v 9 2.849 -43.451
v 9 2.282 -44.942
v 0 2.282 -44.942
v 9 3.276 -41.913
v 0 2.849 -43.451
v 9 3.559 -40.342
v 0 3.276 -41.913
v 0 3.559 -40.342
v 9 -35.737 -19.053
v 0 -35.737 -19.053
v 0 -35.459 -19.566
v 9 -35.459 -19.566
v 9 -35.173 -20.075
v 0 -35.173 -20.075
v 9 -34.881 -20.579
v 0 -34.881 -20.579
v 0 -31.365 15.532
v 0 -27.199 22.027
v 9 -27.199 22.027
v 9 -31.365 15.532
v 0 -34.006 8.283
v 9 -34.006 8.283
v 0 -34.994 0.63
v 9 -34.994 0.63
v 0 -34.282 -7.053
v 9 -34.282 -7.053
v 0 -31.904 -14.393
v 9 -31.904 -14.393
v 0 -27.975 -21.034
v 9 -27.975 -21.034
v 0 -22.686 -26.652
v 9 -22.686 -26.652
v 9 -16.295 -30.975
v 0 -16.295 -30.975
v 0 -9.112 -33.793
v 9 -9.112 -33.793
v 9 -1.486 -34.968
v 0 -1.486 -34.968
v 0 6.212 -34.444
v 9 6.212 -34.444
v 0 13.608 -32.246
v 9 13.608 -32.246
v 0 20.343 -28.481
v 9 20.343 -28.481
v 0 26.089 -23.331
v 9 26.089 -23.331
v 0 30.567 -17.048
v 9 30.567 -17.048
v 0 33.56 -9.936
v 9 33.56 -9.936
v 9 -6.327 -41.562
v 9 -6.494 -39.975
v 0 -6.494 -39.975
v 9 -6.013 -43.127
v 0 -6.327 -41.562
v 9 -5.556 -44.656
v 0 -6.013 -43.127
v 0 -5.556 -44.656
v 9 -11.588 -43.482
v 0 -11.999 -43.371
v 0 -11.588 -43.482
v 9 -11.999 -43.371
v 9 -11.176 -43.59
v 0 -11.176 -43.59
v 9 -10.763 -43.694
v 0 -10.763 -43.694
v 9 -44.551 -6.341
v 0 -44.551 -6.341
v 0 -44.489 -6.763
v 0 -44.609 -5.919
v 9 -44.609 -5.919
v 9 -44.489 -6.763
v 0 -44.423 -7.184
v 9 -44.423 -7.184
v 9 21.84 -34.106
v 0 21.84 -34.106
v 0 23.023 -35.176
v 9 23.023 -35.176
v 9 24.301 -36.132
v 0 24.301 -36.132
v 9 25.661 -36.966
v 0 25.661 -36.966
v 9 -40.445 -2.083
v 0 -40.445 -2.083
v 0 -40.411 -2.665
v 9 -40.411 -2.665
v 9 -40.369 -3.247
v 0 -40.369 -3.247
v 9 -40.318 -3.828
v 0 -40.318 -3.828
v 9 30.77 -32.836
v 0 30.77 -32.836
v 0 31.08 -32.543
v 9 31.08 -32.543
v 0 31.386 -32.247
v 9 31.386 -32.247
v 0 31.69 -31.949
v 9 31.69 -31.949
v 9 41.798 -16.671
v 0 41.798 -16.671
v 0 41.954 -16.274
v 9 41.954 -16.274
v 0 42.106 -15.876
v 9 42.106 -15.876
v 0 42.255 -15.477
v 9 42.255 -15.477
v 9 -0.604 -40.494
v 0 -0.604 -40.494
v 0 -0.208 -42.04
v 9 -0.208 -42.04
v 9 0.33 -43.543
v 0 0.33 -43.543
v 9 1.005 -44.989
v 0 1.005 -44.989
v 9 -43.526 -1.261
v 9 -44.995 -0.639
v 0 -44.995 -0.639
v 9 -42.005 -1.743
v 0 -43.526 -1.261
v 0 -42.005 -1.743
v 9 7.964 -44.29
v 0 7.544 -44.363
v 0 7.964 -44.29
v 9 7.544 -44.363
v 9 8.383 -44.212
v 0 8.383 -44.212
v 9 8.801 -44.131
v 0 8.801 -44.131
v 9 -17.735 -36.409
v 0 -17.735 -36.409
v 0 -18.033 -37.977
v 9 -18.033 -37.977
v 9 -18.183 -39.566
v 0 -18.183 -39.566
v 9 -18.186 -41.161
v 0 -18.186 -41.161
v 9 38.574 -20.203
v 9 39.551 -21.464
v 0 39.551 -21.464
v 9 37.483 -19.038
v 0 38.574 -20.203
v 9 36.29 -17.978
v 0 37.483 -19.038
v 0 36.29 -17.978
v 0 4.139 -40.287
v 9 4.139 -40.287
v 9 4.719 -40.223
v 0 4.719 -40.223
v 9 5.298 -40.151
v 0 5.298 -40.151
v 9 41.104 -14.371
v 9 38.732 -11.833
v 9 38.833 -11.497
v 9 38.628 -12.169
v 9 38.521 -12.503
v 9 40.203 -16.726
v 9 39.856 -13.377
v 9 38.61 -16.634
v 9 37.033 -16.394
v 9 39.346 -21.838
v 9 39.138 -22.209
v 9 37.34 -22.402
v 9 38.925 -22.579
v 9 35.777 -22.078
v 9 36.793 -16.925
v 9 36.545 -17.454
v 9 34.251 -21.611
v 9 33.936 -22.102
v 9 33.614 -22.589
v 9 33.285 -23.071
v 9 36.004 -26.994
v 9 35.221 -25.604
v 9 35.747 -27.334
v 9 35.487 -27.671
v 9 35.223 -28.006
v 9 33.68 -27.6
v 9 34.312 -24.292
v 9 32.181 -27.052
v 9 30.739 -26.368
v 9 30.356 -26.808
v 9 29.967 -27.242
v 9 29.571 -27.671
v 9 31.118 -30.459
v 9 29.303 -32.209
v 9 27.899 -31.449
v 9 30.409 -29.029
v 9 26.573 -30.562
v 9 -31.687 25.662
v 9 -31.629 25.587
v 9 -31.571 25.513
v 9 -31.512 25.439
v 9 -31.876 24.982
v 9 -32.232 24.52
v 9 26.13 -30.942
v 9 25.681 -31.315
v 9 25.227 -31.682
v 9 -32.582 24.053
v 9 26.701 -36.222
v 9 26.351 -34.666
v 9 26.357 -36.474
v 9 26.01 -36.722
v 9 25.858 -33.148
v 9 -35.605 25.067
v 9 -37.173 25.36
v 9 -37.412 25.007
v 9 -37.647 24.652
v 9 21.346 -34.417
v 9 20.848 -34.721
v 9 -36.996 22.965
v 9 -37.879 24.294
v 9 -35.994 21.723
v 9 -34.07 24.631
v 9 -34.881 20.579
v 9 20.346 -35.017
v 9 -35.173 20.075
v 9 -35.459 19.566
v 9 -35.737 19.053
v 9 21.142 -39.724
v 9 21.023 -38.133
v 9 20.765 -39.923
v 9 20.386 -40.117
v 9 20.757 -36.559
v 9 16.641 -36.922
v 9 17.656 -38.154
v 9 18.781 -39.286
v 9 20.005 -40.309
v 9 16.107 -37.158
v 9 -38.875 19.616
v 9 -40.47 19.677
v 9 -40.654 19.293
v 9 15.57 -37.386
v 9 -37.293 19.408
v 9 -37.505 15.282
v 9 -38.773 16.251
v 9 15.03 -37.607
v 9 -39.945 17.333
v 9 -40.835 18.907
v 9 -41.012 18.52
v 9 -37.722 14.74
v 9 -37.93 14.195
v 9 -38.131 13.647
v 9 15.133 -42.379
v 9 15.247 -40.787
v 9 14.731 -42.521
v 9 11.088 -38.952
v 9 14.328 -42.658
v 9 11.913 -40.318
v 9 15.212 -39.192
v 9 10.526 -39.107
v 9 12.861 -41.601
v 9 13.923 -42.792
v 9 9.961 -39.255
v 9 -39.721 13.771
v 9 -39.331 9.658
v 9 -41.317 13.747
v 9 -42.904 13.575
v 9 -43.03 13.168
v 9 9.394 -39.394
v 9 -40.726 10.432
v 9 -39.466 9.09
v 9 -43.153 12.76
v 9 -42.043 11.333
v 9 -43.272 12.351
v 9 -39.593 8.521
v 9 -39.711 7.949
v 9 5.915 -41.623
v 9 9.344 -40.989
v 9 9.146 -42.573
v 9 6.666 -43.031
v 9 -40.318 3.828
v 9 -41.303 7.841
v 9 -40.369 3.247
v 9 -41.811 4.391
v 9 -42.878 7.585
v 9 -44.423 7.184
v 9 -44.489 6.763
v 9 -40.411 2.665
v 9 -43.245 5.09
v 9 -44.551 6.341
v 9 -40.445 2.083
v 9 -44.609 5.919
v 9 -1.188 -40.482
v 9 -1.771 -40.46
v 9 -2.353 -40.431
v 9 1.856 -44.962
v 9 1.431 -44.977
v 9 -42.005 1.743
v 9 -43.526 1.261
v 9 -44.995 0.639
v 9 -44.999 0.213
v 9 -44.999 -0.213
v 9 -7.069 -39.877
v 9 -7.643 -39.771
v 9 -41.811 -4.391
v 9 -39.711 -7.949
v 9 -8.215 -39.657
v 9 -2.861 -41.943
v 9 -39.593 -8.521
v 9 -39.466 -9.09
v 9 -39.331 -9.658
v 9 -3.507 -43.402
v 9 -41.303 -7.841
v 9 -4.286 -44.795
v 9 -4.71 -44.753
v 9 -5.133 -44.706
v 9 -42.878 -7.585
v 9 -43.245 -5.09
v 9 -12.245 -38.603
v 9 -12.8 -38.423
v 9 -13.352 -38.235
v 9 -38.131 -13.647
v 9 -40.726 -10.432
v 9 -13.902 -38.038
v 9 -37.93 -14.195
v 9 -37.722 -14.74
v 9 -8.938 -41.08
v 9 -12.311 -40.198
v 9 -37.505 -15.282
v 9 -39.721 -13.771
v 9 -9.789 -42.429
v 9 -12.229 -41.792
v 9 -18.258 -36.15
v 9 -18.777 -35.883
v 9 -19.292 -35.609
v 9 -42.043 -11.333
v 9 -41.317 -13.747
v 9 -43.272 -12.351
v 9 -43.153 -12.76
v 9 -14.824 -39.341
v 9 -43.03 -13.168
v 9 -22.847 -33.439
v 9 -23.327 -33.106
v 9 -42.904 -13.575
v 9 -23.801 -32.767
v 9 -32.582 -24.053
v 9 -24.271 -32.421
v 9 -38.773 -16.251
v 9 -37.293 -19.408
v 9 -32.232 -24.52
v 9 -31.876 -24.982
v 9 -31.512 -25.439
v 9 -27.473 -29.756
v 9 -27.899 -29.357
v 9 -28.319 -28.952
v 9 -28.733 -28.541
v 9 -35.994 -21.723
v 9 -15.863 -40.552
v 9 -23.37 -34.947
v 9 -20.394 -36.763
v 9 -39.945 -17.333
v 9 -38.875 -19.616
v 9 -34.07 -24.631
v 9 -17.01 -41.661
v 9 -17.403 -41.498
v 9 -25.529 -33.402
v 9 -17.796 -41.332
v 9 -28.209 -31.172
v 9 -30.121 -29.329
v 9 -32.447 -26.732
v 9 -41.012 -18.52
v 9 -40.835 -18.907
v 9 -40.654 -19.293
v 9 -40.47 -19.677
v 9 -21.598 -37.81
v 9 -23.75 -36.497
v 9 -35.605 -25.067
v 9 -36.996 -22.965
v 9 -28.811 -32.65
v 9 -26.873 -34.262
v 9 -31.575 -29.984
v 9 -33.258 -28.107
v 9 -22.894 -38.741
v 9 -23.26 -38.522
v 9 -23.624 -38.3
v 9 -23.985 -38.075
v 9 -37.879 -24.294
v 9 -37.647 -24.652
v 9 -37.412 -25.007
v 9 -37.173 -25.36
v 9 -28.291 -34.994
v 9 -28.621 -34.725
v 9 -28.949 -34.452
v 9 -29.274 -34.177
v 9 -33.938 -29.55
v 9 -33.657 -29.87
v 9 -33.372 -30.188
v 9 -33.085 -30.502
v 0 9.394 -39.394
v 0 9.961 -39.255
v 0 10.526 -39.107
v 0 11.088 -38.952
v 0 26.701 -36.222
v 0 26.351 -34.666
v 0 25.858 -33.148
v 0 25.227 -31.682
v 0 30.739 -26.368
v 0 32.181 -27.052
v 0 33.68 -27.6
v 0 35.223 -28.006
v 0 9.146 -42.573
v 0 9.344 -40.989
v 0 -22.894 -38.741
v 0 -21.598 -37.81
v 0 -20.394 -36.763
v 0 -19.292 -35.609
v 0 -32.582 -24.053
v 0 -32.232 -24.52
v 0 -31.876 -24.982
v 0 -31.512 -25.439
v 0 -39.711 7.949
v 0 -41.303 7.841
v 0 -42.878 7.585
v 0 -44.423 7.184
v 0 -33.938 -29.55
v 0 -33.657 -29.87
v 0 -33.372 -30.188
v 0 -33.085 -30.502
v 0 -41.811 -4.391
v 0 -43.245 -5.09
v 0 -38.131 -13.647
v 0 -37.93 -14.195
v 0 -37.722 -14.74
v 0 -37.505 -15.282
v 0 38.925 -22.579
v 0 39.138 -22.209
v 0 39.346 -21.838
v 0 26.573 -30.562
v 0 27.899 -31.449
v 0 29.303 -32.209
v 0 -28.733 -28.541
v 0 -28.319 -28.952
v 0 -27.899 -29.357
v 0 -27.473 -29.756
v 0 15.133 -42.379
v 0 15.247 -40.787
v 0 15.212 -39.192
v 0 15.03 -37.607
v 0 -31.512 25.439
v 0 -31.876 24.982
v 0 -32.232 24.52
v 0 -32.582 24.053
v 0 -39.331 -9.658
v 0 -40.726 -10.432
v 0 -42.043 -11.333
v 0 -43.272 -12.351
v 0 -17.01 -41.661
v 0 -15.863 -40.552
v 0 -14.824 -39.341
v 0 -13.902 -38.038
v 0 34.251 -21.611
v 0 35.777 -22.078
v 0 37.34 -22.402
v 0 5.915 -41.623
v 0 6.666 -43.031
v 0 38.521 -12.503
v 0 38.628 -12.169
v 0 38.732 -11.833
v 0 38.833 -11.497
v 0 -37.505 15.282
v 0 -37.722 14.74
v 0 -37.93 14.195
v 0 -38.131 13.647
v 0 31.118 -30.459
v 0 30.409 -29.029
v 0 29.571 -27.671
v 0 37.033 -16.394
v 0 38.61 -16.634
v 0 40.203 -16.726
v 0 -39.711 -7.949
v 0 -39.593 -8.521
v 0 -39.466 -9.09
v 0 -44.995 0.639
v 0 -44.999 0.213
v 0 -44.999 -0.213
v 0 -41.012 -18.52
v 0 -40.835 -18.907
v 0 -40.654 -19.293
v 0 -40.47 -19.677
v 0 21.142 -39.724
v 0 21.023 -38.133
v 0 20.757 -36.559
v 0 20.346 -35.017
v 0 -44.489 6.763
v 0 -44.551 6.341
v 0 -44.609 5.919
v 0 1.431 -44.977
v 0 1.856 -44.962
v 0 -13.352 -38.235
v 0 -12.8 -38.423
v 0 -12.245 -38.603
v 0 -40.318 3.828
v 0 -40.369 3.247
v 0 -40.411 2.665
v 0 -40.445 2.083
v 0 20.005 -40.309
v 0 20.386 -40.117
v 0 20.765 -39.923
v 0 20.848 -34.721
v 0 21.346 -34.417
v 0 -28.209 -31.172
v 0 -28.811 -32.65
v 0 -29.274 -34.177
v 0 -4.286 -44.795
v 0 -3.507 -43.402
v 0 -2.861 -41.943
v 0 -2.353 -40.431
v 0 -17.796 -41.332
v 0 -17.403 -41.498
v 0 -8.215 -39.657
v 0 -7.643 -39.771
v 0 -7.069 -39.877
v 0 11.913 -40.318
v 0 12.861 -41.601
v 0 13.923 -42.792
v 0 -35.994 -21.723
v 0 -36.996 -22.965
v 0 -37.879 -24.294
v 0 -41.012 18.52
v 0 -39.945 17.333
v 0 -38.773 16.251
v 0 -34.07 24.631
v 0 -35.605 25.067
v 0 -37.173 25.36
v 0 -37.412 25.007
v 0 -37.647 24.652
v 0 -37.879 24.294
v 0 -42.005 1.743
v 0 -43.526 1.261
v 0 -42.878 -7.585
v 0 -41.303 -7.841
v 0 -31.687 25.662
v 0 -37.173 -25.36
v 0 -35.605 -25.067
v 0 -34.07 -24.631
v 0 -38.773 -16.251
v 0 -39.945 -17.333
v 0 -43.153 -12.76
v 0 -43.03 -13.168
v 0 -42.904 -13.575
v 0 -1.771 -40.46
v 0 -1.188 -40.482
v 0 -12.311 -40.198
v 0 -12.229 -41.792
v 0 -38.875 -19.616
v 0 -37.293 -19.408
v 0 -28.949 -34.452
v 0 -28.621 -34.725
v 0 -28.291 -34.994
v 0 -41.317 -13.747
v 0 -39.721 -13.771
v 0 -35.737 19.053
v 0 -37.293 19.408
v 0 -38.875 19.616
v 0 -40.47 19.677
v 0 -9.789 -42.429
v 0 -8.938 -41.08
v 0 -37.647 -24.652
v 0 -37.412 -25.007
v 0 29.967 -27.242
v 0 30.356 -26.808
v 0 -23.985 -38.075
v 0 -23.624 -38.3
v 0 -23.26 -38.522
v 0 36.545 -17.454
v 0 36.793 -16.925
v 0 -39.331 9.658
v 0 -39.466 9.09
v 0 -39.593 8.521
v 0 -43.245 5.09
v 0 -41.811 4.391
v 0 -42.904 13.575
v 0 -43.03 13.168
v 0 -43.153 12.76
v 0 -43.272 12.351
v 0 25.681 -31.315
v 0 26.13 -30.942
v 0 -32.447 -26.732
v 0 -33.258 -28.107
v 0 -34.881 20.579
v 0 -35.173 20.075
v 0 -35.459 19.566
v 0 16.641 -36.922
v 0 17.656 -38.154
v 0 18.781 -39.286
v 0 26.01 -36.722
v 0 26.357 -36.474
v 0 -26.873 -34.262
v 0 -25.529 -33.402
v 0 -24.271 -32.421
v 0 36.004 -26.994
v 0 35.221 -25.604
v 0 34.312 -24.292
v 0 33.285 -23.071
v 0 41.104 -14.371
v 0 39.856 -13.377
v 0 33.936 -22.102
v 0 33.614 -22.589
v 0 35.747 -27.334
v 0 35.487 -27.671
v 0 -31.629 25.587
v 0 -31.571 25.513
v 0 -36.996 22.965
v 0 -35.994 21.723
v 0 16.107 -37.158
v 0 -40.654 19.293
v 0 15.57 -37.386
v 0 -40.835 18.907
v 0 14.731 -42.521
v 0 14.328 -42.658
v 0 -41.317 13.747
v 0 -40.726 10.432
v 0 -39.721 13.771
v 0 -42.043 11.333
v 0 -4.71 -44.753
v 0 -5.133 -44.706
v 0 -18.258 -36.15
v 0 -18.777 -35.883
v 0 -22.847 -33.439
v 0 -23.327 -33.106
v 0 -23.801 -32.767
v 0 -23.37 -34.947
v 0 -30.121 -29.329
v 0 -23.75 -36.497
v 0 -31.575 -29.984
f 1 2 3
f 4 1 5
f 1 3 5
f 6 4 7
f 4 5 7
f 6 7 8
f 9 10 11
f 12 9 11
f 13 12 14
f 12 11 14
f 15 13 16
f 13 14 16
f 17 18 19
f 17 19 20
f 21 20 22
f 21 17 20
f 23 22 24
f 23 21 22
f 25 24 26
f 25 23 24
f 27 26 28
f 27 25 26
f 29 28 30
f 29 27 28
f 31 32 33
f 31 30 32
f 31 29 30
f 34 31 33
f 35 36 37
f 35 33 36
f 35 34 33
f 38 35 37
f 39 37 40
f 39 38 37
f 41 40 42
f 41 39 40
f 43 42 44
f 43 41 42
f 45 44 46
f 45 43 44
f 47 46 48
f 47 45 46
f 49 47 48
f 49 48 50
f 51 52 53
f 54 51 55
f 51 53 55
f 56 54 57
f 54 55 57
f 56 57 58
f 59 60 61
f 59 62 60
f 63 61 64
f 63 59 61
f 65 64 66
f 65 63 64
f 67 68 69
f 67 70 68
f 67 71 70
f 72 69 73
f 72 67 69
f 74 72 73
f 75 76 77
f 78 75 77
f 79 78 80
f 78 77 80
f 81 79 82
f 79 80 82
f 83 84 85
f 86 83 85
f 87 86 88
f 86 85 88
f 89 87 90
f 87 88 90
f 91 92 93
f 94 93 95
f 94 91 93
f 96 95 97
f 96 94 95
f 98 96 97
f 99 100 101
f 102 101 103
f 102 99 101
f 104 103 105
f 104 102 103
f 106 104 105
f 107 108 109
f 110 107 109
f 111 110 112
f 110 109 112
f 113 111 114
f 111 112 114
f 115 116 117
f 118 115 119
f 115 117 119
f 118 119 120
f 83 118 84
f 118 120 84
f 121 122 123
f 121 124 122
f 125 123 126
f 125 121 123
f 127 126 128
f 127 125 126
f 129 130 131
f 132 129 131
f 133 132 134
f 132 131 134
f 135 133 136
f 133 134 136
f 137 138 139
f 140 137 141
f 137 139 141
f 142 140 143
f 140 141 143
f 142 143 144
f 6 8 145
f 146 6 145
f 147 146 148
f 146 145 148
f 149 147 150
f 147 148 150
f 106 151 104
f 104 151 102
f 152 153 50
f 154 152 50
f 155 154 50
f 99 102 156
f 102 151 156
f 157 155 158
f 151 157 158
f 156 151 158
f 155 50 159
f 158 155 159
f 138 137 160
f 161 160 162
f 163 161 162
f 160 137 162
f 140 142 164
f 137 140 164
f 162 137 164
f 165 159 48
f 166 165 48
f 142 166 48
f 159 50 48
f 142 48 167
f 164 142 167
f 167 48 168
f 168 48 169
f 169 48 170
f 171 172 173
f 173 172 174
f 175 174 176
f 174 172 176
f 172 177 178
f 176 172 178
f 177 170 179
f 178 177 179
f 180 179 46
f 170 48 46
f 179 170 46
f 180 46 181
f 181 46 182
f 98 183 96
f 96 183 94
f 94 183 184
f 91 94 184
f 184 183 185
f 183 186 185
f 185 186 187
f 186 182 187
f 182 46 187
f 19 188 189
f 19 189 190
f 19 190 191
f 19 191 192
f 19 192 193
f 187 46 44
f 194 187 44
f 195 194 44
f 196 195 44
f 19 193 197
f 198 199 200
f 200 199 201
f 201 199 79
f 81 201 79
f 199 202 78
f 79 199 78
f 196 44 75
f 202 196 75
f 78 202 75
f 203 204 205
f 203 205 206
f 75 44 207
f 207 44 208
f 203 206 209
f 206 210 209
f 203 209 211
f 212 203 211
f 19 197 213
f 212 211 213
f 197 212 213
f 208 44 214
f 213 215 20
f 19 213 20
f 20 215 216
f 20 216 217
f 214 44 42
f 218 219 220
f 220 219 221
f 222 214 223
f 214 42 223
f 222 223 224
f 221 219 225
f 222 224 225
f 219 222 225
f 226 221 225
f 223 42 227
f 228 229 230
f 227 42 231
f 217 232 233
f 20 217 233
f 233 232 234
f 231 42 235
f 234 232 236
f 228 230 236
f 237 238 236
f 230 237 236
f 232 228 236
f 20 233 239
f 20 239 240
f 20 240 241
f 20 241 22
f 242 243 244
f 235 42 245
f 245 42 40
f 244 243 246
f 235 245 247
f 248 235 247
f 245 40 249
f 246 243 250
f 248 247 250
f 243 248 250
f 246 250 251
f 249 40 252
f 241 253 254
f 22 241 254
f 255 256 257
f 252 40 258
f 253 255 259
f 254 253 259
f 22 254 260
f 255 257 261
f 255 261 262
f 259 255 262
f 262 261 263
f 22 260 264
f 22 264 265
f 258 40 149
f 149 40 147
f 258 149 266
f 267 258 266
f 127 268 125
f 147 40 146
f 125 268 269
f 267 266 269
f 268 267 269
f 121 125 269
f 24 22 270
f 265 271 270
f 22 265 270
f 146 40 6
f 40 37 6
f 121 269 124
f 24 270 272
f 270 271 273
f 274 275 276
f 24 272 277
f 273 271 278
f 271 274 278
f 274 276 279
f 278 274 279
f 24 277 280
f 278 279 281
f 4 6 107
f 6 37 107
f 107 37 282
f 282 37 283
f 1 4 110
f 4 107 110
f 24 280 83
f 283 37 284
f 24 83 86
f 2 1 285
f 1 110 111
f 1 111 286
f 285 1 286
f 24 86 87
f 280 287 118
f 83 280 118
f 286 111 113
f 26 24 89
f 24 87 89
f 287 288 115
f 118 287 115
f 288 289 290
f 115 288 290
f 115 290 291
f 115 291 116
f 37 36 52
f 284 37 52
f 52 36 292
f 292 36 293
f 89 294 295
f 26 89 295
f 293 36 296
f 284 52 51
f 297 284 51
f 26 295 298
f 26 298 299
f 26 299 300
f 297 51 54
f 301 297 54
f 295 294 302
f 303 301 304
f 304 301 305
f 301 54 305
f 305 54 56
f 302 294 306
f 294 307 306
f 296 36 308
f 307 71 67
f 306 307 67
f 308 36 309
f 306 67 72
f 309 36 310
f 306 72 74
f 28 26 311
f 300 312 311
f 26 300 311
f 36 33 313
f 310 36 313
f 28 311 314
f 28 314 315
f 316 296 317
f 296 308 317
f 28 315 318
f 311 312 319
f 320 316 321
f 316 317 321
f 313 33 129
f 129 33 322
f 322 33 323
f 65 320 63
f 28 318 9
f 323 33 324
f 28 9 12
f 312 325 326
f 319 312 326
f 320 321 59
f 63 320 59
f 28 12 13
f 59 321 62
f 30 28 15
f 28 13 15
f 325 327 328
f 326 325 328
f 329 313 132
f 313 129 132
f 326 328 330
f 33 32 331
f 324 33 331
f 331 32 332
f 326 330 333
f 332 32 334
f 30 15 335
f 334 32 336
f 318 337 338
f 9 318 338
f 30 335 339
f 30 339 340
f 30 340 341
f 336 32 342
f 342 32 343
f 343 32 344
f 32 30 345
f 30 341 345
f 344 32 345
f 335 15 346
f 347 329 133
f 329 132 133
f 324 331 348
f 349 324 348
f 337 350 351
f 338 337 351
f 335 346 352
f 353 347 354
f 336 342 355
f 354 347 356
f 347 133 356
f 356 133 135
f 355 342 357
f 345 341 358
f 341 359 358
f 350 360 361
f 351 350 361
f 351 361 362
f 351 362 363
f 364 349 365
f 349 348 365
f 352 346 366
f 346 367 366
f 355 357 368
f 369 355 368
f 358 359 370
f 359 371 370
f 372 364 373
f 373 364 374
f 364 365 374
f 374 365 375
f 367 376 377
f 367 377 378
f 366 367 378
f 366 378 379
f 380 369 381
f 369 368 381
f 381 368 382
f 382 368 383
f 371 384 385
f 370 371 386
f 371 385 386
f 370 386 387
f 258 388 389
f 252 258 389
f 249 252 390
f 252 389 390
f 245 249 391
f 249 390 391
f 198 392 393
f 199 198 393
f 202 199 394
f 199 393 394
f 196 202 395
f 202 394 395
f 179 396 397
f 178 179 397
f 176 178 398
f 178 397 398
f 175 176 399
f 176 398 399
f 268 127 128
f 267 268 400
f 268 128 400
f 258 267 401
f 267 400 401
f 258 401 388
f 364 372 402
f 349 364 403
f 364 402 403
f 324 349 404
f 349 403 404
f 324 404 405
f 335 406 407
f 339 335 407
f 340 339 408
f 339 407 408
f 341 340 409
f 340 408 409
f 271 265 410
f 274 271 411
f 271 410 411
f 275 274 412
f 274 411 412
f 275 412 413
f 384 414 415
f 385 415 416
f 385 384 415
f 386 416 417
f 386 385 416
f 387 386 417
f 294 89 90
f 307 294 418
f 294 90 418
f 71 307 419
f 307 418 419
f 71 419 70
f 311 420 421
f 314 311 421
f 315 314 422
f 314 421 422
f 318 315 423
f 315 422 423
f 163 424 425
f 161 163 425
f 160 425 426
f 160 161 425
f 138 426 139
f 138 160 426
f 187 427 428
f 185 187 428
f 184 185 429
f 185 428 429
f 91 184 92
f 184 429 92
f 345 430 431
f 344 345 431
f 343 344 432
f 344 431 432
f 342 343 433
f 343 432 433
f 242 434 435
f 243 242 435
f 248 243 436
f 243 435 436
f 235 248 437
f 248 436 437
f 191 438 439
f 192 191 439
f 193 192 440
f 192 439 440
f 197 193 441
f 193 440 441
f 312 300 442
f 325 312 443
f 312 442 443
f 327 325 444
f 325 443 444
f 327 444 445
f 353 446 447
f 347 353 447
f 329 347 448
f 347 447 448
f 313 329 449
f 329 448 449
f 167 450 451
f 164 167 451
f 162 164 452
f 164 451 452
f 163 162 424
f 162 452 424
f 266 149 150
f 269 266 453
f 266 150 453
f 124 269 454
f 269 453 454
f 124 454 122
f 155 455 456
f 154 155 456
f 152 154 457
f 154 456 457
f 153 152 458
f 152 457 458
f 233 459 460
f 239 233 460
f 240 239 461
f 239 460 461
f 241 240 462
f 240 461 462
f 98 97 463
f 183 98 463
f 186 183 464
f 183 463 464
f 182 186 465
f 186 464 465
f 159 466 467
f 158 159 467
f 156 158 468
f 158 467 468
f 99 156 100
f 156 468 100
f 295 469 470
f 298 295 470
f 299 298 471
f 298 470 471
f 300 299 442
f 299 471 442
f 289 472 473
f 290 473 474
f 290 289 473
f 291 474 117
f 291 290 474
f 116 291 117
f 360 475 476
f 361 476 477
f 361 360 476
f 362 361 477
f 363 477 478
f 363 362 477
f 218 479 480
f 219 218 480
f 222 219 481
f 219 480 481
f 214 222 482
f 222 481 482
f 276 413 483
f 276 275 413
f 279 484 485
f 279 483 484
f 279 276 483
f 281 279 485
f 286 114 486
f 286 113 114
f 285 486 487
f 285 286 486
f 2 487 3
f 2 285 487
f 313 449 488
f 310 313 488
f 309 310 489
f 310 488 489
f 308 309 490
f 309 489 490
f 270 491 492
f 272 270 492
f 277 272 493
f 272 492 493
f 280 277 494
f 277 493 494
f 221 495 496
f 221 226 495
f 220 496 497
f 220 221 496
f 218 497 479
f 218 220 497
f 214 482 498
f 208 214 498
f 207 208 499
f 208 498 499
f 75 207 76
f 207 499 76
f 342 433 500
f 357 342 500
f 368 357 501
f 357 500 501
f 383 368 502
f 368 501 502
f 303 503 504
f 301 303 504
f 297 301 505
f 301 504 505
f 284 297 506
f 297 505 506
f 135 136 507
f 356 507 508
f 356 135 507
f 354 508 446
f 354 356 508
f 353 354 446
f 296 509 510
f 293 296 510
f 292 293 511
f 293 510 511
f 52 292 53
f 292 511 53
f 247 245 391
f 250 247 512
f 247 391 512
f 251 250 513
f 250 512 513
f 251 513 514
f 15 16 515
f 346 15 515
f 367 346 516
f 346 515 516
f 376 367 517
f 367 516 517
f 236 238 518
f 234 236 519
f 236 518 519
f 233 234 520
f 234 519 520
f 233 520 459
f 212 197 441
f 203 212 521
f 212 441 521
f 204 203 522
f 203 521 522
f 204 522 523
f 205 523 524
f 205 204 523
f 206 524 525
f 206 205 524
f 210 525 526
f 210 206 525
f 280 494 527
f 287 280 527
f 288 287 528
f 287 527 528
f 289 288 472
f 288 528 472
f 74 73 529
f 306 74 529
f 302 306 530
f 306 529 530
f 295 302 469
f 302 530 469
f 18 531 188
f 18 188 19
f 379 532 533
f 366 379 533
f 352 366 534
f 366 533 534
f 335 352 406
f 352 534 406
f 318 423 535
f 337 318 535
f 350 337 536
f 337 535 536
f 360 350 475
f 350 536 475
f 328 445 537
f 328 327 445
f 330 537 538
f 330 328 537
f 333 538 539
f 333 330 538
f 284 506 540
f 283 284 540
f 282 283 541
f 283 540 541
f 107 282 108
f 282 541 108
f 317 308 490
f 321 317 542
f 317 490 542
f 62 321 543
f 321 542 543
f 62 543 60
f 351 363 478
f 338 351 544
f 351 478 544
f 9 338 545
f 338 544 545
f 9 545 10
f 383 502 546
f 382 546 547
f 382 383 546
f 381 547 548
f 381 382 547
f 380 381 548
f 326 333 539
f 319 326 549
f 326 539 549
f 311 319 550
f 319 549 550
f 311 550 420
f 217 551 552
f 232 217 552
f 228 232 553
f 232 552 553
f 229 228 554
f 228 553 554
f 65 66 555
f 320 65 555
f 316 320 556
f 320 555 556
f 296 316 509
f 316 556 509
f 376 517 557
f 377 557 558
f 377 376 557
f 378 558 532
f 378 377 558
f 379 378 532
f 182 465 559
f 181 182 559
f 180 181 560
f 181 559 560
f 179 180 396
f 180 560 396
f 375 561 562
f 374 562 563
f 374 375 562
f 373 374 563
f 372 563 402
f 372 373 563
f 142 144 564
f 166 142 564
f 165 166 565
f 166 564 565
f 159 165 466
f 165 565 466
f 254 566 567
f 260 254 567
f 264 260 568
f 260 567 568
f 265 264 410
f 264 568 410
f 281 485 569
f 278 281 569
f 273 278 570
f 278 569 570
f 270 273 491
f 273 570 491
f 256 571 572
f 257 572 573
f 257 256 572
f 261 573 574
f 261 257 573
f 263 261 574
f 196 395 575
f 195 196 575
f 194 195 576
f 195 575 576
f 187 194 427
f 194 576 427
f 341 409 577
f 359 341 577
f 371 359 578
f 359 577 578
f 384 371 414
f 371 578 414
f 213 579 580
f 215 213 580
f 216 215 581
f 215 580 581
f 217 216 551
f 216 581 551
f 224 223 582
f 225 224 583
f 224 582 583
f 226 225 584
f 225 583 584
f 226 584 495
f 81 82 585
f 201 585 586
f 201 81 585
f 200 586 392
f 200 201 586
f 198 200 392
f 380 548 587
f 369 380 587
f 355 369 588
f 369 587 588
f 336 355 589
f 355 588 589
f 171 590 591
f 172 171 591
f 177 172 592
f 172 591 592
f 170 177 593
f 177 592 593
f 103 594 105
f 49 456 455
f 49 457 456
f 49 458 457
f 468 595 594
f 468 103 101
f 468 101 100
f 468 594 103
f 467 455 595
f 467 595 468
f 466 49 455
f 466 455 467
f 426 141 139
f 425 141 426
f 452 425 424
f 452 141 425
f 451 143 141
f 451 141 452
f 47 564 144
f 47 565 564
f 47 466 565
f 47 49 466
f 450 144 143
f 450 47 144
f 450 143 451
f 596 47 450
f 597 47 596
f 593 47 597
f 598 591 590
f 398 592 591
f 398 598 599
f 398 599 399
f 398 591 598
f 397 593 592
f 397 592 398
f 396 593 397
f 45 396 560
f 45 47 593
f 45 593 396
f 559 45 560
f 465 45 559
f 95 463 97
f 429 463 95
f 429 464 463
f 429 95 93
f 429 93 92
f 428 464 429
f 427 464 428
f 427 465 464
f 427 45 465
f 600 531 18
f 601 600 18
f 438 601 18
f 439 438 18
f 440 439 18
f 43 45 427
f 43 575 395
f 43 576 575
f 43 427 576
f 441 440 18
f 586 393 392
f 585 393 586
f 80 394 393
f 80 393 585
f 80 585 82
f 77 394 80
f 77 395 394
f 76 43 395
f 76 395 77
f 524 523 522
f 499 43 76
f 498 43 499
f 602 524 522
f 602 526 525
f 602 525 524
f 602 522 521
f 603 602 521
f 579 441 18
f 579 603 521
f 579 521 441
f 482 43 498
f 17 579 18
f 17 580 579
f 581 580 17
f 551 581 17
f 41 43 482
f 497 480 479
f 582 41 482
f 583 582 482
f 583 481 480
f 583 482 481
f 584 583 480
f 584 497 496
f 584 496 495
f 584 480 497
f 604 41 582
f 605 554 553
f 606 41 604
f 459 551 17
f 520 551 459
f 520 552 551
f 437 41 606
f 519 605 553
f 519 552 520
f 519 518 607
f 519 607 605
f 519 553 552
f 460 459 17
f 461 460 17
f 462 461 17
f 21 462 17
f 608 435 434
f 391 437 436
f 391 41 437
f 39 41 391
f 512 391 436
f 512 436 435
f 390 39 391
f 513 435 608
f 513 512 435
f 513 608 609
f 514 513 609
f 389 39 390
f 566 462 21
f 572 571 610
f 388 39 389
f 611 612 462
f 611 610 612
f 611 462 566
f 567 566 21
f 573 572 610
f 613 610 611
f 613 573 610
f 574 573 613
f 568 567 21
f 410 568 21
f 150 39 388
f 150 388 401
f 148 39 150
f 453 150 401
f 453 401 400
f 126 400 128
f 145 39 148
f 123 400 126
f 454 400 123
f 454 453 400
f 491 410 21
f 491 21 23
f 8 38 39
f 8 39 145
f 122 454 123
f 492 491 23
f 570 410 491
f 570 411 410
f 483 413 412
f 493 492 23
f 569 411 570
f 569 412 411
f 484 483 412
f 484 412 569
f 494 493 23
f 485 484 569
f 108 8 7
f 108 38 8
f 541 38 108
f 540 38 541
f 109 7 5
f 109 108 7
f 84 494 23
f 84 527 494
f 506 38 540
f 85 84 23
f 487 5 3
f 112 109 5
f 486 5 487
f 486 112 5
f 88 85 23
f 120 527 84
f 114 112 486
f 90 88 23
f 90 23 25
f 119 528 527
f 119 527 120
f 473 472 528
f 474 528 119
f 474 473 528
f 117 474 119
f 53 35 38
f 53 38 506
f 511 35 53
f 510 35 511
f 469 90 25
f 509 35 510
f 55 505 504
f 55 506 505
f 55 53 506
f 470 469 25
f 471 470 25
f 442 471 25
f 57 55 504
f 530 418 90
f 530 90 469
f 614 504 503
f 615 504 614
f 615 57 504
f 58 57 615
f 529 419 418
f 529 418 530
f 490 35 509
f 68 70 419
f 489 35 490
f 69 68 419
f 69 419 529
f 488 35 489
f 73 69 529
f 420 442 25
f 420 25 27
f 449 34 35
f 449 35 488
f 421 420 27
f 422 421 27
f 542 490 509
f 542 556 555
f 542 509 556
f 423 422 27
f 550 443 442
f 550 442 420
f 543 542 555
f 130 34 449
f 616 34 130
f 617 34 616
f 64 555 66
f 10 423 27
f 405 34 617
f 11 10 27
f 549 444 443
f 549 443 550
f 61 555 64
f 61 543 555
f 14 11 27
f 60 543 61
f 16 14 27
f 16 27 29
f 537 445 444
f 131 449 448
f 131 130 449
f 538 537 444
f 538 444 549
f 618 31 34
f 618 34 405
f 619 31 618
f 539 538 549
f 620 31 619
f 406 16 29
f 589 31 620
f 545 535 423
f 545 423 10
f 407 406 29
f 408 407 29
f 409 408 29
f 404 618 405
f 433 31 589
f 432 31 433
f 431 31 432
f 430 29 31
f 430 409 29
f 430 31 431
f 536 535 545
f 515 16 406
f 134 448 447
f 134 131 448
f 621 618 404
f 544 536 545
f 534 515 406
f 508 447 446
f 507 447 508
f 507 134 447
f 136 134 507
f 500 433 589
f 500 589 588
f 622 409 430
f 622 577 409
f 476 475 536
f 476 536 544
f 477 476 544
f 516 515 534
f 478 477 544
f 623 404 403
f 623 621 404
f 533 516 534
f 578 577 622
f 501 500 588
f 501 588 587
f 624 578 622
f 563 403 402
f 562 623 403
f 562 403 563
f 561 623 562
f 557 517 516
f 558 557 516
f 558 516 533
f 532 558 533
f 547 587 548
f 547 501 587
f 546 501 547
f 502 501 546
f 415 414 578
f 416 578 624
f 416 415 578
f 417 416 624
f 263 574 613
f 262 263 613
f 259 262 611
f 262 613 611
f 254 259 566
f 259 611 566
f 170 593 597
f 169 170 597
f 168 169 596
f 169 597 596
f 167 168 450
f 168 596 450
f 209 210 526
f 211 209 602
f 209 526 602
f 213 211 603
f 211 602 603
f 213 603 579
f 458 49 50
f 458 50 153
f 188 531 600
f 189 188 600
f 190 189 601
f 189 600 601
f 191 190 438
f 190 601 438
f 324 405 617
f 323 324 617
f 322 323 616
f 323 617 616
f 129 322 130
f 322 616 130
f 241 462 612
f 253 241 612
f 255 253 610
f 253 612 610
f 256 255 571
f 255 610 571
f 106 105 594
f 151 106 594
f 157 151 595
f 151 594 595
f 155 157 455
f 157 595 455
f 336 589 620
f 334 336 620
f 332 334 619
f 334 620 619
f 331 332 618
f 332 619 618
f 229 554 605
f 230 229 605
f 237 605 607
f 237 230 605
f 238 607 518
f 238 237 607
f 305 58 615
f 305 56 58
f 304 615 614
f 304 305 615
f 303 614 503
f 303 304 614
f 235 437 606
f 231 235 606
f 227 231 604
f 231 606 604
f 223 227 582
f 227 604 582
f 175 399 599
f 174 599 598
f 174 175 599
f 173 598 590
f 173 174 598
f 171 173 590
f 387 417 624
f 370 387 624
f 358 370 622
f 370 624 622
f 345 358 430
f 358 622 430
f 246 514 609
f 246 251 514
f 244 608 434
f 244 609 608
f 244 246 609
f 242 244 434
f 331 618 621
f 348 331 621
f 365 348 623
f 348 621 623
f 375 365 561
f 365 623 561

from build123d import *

# Parameters (mm, degrees)
BASPROSKE_W                = 9
BASPROSKE_H                = 45
TOOTHCUT_DEPTH             = 65.272855857
TEETHCUTS_COUNT            = 43
TEETHCUTS_ANGLE            = 351.627906977
BORSKE_R                   = 3
BORE_DEPTH                 = 50.0000508
WYTNIJ_WYCI_GNI_CIE1_DEPTH = 65.265003825


with BuildPart() as part:
    # BasProSke → Base-Revolve (revolve)
    with BuildSketch(Plane(origin=(0, 0, 0), x_dir=(1, 0, 0), z_dir=(0, 1, 0)), mode=Mode.PRIVATE) as base_revolve_sk:
        with Locations((4.5, 22.5)):
            Rectangle(BASPROSKE_W, BASPROSKE_H)
    revolve(base_revolve_sk.sketch.rotate(Axis((-10, 0, 0), (1, 0, 0)), 180), axis=Axis((-10, 0, 0), (1, 0, 0)))

    # TooCutSke → ToothCut (cut, through all)
    with BuildSketch(Plane(origin=(0, 0, 0), x_dir=(0, 0, -1), z_dir=(1, 0, 0))):
        with BuildLine():
            ThreePointArc((0.875138877, 40.489543501), (0, 40.499), (-0.875138877, 40.489543501))
            ThreePointArc((-0.875138877, 40.489543501), (-1.611840844, 42.780747503), (-2.66114443, 44.94669015))
            ThreePointArc((-2.66114443, 44.94669015), (0, 45.0254), (2.66114443, 44.94669015))
            ThreePointArc((2.66114443, 44.94669015), (1.611840844, 42.780747503), (0.875138877, 40.489543501))
        make_face()
    toothcut = extrude(amount=TOOTHCUT_DEPTH, mode=Mode.SUBTRACT)

    # TeethCuts: ToothCut ×43 about axis
    teethcuts_axis = Axis((-10, 0, 0), (1, 0, 0))
    for i in range(1, TEETHCUTS_COUNT):
        add(toothcut.rotate(teethcuts_axis, i * TEETHCUTS_ANGLE / (TEETHCUTS_COUNT - 1)), mode=Mode.SUBTRACT)

    # BorSke → Bore (cut, symmetric)
    with BuildSketch(Plane(origin=(0, 0, 0), x_dir=(0, 0, -1), z_dir=(1, 0, 0))):
        with Locations(Location((0, 0, 0), (0, 0, 180))):
            Circle(BORSKE_R)
    extrude(amount=BORE_DEPTH, both=True, mode=Mode.SUBTRACT)

    # Szkic2 → Wytnij-wyciągnięcie1 (cut, through all)
    with BuildSketch(Plane(origin=(0, 0, 0), x_dir=(0, 0, -1), z_dir=(1, 0, 0))):
        with BuildLine():
            Line((-31.467717921, -38.8559227), (-22.027402545, -27.19914589))
            ThreePointArc((-22.027402545, -27.19914589), (30.975282492, -16.295148804), (9.936124572, 33.559997445))
            Line((9.936124572, 33.559997445), (14.194463674, 47.942853492))
            ThreePointArc((14.194463674, 47.942853492), (-44.25040356, 23.278784006), (-31.467717921, -38.8559227))
        make_face()
    extrude(amount=WYTNIJ_WYCI_GNI_CIE1_DEPTH, mode=Mode.SUBTRACT)


solid = part.part
